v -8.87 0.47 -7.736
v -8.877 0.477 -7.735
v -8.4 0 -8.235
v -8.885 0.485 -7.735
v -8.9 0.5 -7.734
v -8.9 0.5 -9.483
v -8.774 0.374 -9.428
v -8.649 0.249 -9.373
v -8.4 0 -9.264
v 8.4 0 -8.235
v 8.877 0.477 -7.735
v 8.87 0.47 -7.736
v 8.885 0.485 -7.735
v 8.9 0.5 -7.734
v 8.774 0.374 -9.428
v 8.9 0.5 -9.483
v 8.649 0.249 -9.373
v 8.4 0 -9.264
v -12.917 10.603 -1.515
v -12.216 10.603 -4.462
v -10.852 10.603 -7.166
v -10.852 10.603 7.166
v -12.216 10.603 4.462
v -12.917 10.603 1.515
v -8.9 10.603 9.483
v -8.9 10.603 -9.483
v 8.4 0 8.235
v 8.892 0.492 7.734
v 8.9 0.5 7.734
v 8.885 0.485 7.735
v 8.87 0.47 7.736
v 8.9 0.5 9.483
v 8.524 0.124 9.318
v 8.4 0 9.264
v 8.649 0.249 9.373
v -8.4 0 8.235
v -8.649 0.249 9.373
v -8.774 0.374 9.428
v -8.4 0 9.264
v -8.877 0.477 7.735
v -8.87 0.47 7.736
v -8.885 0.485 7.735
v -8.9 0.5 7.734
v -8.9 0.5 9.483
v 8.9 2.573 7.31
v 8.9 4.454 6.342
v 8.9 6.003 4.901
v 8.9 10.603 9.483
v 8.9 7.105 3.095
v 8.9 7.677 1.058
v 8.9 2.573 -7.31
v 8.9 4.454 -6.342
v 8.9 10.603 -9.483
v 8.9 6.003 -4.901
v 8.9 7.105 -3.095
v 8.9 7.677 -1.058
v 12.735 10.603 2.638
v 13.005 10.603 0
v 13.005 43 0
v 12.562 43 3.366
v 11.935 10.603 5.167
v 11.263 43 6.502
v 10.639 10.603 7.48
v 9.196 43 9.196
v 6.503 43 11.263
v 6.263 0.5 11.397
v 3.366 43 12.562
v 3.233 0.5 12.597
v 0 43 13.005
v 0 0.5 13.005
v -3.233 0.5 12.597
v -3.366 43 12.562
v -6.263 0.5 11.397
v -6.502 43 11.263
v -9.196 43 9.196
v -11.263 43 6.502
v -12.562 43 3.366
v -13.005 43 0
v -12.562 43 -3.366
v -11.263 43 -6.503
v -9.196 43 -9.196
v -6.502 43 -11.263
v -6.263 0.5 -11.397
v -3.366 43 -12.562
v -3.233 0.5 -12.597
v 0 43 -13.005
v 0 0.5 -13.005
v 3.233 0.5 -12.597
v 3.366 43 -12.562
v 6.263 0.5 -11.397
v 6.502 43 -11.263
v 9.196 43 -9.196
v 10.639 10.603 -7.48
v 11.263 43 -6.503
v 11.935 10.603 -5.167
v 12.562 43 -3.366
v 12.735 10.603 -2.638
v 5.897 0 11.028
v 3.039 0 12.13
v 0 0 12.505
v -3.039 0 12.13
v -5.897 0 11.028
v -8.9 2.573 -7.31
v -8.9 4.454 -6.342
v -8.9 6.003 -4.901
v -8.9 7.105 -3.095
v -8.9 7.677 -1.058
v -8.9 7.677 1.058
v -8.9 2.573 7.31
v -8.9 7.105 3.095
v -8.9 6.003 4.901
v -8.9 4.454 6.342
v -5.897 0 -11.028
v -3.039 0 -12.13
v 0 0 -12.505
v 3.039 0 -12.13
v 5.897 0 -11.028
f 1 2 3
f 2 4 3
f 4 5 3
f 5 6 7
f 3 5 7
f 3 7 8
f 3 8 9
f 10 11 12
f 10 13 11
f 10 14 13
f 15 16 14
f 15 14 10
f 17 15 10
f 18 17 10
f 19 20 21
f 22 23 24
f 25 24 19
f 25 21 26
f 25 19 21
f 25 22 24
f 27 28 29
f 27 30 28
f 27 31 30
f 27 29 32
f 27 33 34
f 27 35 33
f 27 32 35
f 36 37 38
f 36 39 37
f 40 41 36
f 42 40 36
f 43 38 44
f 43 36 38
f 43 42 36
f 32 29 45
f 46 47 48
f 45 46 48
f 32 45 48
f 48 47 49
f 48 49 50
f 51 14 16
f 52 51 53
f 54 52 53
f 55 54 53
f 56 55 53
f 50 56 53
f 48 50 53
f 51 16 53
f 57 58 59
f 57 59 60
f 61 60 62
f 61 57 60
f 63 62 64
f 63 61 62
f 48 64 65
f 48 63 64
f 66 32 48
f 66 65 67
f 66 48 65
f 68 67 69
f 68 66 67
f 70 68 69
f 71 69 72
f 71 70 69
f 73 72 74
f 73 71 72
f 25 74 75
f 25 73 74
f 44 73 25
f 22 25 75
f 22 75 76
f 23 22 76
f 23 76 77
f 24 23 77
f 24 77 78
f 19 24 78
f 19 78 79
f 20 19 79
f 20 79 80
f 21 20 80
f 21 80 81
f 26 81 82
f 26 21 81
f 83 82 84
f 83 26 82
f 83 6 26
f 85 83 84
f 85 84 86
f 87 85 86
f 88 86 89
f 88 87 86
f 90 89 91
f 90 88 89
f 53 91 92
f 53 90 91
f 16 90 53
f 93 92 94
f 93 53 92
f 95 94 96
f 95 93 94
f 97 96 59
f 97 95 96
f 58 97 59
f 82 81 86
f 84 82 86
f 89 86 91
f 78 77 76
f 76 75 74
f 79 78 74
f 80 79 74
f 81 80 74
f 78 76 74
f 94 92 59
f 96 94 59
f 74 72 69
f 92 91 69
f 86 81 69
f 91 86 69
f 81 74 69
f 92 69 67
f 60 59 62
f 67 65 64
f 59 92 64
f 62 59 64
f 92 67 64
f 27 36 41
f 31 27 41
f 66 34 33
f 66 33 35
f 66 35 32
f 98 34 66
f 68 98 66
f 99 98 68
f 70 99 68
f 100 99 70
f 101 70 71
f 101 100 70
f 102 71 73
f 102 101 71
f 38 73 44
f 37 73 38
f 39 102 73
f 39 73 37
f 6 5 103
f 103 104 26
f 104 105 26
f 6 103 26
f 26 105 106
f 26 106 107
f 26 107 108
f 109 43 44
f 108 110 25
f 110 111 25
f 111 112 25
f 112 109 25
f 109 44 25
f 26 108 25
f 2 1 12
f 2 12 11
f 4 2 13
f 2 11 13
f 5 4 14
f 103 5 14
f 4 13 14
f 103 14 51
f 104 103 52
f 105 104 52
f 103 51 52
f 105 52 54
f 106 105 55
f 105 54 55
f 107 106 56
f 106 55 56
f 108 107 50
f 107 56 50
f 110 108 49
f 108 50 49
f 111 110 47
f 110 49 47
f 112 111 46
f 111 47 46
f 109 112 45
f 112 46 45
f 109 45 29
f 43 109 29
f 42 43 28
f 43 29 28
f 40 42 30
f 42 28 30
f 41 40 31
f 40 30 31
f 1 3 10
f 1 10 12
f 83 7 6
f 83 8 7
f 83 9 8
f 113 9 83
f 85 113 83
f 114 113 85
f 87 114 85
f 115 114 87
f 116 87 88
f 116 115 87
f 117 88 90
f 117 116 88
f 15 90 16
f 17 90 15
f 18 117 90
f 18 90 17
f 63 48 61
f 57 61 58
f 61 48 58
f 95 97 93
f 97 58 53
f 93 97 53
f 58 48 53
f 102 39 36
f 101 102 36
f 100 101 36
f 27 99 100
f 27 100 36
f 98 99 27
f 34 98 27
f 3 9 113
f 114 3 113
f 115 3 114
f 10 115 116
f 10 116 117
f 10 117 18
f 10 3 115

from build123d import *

# Parameters (mm, degrees)
F0_R          = 13.005
F1_DEPTH      = 43
F2_R          = 7.75
F3_DEPTH      = 13.006
F3_DEPTH_BACK = 25
F4_W          = 7.1834153318
F4_H          = 12.5
F5_DEPTH      = 12.5
F6_T1_DEPTH   = 4.3042999791
F6_T3_DEPTH   = 20.2979349857
F6_T5_DEPTH   = 4.3042999791
F6_T8_ANGLE   = 97.7035470752
F6_T10_ANGLE  = 97.7035470752


# Not quite as in the source:
# - a fillet or chamfer that OpenCascade refuses, or shapes differently, is made with other operations: its cross-section is extruded or revolved along the edge and cut away or added


with BuildPart() as f1:
    # F0 (on Front) → F1 (new body)
    with BuildSketch(Plane.XZ):
        Circle(F0_R)
    extrude(amount=-F1_DEPTH)

    # F2 (on Right) → F3 (cut, two sides)
    with BuildSketch(Plane.YZ) as f3_sk:
        Circle(F2_R)
    extrude(amount=-F3_DEPTH, mode=Mode.SUBTRACT)
    extrude(f3_sk.sketch, amount=F3_DEPTH_BACK, mode=Mode.SUBTRACT)

    # F4 (on Top) → F5 (cut, symmetric)
    with BuildSketch(Plane.XY):
        with Locations((12.4917076659, 4.3530291878)):
            Rectangle(F4_W, F4_H)
        with Locations((-12.4917076659, 4.3530291878)):
            Rectangle(F4_W, F4_H)
    extrude(amount=F5_DEPTH, both=True, mode=Mode.SUBTRACT)

    # F6: chamfer of 0.5 on 8 edges, made by hand

    # F6_s2 → F6_t1 (cut)
    with BuildSketch(Plane.XY.offset(6.464158506)):
        Polygon((-8.4, 0), (-8.9, 0.5), (-8.9, 0), align=None)
        Polygon((8.9, 0.5), (8.4, 0), (8.9, 0), align=None)
    extrude(amount=F6_T1_DEPTH, mode=Mode.SUBTRACT)

    # F6_s4 → F6_t3 (cut)
    with BuildSketch(Plane.YZ.offset(-10.1489674928)):
        with BuildLine():
            Line((0, 8.234834546), (0.4696969697, 7.7357536644))
            ThreePointArc((0.4696969697, 7.7357536644), (0.2420339134, 7.7462196964), (0, 7.75))
            Line((0, 7.75), (0, 8.234834546))
        make_face()
        with BuildLine():
            Line((0, -8.234834546), (0.4696969697, -7.7357536644))
            ThreePointArc((0.4696969697, -7.7357536644), (0.2420339134, -7.7462196964), (0, -7.75))
            Line((0, -7.75), (0, -8.234834546))
        make_face()
    extrude(amount=F6_T3_DEPTH, mode=Mode.SUBTRACT)

    # F6_s6 → F6_t5 (cut)
    with BuildSketch(Plane.XY.offset(-10.7684584851)):
        Polygon((-8.9, 0.5), (-8.4, 0), (-8.9, 0), align=None)
        Polygon((8.9, 0.5), (8.4, 0), (8.9, 0), align=None)
    extrude(amount=F6_T5_DEPTH, mode=Mode.SUBTRACT)

    # F6_s7 → F6_t8 (revolve, cut)
    with BuildSketch(Plane(origin=(0, 0, 0), x_dir=(0, 1, 0), z_dir=(0.6580092951, 0, -0.7530098057))):
        Polygon((0.5, 13.005), (0, 12.505), (0, 13.005), align=None)
    revolve(axis=Axis((0, 0, 0), (0, -1, 0)), revolution_arc=F6_T8_ANGLE, mode=Mode.SUBTRACT)

    # F6_s9 → F6_t10 (revolve, cut)
    with BuildSketch(Plane(origin=(0, 0, 0), x_dir=(0, 1, 0), z_dir=(-0.6580092951, 0, 0.7530098057))):
        Polygon((0.5, 13.005), (0, 12.505), (0, 13.005), align=None)
    revolve(axis=Axis((0, 0, 0), (0, -1, 0)), revolution_arc=F6_T10_ANGLE, mode=Mode.SUBTRACT)


solid = f1.part
